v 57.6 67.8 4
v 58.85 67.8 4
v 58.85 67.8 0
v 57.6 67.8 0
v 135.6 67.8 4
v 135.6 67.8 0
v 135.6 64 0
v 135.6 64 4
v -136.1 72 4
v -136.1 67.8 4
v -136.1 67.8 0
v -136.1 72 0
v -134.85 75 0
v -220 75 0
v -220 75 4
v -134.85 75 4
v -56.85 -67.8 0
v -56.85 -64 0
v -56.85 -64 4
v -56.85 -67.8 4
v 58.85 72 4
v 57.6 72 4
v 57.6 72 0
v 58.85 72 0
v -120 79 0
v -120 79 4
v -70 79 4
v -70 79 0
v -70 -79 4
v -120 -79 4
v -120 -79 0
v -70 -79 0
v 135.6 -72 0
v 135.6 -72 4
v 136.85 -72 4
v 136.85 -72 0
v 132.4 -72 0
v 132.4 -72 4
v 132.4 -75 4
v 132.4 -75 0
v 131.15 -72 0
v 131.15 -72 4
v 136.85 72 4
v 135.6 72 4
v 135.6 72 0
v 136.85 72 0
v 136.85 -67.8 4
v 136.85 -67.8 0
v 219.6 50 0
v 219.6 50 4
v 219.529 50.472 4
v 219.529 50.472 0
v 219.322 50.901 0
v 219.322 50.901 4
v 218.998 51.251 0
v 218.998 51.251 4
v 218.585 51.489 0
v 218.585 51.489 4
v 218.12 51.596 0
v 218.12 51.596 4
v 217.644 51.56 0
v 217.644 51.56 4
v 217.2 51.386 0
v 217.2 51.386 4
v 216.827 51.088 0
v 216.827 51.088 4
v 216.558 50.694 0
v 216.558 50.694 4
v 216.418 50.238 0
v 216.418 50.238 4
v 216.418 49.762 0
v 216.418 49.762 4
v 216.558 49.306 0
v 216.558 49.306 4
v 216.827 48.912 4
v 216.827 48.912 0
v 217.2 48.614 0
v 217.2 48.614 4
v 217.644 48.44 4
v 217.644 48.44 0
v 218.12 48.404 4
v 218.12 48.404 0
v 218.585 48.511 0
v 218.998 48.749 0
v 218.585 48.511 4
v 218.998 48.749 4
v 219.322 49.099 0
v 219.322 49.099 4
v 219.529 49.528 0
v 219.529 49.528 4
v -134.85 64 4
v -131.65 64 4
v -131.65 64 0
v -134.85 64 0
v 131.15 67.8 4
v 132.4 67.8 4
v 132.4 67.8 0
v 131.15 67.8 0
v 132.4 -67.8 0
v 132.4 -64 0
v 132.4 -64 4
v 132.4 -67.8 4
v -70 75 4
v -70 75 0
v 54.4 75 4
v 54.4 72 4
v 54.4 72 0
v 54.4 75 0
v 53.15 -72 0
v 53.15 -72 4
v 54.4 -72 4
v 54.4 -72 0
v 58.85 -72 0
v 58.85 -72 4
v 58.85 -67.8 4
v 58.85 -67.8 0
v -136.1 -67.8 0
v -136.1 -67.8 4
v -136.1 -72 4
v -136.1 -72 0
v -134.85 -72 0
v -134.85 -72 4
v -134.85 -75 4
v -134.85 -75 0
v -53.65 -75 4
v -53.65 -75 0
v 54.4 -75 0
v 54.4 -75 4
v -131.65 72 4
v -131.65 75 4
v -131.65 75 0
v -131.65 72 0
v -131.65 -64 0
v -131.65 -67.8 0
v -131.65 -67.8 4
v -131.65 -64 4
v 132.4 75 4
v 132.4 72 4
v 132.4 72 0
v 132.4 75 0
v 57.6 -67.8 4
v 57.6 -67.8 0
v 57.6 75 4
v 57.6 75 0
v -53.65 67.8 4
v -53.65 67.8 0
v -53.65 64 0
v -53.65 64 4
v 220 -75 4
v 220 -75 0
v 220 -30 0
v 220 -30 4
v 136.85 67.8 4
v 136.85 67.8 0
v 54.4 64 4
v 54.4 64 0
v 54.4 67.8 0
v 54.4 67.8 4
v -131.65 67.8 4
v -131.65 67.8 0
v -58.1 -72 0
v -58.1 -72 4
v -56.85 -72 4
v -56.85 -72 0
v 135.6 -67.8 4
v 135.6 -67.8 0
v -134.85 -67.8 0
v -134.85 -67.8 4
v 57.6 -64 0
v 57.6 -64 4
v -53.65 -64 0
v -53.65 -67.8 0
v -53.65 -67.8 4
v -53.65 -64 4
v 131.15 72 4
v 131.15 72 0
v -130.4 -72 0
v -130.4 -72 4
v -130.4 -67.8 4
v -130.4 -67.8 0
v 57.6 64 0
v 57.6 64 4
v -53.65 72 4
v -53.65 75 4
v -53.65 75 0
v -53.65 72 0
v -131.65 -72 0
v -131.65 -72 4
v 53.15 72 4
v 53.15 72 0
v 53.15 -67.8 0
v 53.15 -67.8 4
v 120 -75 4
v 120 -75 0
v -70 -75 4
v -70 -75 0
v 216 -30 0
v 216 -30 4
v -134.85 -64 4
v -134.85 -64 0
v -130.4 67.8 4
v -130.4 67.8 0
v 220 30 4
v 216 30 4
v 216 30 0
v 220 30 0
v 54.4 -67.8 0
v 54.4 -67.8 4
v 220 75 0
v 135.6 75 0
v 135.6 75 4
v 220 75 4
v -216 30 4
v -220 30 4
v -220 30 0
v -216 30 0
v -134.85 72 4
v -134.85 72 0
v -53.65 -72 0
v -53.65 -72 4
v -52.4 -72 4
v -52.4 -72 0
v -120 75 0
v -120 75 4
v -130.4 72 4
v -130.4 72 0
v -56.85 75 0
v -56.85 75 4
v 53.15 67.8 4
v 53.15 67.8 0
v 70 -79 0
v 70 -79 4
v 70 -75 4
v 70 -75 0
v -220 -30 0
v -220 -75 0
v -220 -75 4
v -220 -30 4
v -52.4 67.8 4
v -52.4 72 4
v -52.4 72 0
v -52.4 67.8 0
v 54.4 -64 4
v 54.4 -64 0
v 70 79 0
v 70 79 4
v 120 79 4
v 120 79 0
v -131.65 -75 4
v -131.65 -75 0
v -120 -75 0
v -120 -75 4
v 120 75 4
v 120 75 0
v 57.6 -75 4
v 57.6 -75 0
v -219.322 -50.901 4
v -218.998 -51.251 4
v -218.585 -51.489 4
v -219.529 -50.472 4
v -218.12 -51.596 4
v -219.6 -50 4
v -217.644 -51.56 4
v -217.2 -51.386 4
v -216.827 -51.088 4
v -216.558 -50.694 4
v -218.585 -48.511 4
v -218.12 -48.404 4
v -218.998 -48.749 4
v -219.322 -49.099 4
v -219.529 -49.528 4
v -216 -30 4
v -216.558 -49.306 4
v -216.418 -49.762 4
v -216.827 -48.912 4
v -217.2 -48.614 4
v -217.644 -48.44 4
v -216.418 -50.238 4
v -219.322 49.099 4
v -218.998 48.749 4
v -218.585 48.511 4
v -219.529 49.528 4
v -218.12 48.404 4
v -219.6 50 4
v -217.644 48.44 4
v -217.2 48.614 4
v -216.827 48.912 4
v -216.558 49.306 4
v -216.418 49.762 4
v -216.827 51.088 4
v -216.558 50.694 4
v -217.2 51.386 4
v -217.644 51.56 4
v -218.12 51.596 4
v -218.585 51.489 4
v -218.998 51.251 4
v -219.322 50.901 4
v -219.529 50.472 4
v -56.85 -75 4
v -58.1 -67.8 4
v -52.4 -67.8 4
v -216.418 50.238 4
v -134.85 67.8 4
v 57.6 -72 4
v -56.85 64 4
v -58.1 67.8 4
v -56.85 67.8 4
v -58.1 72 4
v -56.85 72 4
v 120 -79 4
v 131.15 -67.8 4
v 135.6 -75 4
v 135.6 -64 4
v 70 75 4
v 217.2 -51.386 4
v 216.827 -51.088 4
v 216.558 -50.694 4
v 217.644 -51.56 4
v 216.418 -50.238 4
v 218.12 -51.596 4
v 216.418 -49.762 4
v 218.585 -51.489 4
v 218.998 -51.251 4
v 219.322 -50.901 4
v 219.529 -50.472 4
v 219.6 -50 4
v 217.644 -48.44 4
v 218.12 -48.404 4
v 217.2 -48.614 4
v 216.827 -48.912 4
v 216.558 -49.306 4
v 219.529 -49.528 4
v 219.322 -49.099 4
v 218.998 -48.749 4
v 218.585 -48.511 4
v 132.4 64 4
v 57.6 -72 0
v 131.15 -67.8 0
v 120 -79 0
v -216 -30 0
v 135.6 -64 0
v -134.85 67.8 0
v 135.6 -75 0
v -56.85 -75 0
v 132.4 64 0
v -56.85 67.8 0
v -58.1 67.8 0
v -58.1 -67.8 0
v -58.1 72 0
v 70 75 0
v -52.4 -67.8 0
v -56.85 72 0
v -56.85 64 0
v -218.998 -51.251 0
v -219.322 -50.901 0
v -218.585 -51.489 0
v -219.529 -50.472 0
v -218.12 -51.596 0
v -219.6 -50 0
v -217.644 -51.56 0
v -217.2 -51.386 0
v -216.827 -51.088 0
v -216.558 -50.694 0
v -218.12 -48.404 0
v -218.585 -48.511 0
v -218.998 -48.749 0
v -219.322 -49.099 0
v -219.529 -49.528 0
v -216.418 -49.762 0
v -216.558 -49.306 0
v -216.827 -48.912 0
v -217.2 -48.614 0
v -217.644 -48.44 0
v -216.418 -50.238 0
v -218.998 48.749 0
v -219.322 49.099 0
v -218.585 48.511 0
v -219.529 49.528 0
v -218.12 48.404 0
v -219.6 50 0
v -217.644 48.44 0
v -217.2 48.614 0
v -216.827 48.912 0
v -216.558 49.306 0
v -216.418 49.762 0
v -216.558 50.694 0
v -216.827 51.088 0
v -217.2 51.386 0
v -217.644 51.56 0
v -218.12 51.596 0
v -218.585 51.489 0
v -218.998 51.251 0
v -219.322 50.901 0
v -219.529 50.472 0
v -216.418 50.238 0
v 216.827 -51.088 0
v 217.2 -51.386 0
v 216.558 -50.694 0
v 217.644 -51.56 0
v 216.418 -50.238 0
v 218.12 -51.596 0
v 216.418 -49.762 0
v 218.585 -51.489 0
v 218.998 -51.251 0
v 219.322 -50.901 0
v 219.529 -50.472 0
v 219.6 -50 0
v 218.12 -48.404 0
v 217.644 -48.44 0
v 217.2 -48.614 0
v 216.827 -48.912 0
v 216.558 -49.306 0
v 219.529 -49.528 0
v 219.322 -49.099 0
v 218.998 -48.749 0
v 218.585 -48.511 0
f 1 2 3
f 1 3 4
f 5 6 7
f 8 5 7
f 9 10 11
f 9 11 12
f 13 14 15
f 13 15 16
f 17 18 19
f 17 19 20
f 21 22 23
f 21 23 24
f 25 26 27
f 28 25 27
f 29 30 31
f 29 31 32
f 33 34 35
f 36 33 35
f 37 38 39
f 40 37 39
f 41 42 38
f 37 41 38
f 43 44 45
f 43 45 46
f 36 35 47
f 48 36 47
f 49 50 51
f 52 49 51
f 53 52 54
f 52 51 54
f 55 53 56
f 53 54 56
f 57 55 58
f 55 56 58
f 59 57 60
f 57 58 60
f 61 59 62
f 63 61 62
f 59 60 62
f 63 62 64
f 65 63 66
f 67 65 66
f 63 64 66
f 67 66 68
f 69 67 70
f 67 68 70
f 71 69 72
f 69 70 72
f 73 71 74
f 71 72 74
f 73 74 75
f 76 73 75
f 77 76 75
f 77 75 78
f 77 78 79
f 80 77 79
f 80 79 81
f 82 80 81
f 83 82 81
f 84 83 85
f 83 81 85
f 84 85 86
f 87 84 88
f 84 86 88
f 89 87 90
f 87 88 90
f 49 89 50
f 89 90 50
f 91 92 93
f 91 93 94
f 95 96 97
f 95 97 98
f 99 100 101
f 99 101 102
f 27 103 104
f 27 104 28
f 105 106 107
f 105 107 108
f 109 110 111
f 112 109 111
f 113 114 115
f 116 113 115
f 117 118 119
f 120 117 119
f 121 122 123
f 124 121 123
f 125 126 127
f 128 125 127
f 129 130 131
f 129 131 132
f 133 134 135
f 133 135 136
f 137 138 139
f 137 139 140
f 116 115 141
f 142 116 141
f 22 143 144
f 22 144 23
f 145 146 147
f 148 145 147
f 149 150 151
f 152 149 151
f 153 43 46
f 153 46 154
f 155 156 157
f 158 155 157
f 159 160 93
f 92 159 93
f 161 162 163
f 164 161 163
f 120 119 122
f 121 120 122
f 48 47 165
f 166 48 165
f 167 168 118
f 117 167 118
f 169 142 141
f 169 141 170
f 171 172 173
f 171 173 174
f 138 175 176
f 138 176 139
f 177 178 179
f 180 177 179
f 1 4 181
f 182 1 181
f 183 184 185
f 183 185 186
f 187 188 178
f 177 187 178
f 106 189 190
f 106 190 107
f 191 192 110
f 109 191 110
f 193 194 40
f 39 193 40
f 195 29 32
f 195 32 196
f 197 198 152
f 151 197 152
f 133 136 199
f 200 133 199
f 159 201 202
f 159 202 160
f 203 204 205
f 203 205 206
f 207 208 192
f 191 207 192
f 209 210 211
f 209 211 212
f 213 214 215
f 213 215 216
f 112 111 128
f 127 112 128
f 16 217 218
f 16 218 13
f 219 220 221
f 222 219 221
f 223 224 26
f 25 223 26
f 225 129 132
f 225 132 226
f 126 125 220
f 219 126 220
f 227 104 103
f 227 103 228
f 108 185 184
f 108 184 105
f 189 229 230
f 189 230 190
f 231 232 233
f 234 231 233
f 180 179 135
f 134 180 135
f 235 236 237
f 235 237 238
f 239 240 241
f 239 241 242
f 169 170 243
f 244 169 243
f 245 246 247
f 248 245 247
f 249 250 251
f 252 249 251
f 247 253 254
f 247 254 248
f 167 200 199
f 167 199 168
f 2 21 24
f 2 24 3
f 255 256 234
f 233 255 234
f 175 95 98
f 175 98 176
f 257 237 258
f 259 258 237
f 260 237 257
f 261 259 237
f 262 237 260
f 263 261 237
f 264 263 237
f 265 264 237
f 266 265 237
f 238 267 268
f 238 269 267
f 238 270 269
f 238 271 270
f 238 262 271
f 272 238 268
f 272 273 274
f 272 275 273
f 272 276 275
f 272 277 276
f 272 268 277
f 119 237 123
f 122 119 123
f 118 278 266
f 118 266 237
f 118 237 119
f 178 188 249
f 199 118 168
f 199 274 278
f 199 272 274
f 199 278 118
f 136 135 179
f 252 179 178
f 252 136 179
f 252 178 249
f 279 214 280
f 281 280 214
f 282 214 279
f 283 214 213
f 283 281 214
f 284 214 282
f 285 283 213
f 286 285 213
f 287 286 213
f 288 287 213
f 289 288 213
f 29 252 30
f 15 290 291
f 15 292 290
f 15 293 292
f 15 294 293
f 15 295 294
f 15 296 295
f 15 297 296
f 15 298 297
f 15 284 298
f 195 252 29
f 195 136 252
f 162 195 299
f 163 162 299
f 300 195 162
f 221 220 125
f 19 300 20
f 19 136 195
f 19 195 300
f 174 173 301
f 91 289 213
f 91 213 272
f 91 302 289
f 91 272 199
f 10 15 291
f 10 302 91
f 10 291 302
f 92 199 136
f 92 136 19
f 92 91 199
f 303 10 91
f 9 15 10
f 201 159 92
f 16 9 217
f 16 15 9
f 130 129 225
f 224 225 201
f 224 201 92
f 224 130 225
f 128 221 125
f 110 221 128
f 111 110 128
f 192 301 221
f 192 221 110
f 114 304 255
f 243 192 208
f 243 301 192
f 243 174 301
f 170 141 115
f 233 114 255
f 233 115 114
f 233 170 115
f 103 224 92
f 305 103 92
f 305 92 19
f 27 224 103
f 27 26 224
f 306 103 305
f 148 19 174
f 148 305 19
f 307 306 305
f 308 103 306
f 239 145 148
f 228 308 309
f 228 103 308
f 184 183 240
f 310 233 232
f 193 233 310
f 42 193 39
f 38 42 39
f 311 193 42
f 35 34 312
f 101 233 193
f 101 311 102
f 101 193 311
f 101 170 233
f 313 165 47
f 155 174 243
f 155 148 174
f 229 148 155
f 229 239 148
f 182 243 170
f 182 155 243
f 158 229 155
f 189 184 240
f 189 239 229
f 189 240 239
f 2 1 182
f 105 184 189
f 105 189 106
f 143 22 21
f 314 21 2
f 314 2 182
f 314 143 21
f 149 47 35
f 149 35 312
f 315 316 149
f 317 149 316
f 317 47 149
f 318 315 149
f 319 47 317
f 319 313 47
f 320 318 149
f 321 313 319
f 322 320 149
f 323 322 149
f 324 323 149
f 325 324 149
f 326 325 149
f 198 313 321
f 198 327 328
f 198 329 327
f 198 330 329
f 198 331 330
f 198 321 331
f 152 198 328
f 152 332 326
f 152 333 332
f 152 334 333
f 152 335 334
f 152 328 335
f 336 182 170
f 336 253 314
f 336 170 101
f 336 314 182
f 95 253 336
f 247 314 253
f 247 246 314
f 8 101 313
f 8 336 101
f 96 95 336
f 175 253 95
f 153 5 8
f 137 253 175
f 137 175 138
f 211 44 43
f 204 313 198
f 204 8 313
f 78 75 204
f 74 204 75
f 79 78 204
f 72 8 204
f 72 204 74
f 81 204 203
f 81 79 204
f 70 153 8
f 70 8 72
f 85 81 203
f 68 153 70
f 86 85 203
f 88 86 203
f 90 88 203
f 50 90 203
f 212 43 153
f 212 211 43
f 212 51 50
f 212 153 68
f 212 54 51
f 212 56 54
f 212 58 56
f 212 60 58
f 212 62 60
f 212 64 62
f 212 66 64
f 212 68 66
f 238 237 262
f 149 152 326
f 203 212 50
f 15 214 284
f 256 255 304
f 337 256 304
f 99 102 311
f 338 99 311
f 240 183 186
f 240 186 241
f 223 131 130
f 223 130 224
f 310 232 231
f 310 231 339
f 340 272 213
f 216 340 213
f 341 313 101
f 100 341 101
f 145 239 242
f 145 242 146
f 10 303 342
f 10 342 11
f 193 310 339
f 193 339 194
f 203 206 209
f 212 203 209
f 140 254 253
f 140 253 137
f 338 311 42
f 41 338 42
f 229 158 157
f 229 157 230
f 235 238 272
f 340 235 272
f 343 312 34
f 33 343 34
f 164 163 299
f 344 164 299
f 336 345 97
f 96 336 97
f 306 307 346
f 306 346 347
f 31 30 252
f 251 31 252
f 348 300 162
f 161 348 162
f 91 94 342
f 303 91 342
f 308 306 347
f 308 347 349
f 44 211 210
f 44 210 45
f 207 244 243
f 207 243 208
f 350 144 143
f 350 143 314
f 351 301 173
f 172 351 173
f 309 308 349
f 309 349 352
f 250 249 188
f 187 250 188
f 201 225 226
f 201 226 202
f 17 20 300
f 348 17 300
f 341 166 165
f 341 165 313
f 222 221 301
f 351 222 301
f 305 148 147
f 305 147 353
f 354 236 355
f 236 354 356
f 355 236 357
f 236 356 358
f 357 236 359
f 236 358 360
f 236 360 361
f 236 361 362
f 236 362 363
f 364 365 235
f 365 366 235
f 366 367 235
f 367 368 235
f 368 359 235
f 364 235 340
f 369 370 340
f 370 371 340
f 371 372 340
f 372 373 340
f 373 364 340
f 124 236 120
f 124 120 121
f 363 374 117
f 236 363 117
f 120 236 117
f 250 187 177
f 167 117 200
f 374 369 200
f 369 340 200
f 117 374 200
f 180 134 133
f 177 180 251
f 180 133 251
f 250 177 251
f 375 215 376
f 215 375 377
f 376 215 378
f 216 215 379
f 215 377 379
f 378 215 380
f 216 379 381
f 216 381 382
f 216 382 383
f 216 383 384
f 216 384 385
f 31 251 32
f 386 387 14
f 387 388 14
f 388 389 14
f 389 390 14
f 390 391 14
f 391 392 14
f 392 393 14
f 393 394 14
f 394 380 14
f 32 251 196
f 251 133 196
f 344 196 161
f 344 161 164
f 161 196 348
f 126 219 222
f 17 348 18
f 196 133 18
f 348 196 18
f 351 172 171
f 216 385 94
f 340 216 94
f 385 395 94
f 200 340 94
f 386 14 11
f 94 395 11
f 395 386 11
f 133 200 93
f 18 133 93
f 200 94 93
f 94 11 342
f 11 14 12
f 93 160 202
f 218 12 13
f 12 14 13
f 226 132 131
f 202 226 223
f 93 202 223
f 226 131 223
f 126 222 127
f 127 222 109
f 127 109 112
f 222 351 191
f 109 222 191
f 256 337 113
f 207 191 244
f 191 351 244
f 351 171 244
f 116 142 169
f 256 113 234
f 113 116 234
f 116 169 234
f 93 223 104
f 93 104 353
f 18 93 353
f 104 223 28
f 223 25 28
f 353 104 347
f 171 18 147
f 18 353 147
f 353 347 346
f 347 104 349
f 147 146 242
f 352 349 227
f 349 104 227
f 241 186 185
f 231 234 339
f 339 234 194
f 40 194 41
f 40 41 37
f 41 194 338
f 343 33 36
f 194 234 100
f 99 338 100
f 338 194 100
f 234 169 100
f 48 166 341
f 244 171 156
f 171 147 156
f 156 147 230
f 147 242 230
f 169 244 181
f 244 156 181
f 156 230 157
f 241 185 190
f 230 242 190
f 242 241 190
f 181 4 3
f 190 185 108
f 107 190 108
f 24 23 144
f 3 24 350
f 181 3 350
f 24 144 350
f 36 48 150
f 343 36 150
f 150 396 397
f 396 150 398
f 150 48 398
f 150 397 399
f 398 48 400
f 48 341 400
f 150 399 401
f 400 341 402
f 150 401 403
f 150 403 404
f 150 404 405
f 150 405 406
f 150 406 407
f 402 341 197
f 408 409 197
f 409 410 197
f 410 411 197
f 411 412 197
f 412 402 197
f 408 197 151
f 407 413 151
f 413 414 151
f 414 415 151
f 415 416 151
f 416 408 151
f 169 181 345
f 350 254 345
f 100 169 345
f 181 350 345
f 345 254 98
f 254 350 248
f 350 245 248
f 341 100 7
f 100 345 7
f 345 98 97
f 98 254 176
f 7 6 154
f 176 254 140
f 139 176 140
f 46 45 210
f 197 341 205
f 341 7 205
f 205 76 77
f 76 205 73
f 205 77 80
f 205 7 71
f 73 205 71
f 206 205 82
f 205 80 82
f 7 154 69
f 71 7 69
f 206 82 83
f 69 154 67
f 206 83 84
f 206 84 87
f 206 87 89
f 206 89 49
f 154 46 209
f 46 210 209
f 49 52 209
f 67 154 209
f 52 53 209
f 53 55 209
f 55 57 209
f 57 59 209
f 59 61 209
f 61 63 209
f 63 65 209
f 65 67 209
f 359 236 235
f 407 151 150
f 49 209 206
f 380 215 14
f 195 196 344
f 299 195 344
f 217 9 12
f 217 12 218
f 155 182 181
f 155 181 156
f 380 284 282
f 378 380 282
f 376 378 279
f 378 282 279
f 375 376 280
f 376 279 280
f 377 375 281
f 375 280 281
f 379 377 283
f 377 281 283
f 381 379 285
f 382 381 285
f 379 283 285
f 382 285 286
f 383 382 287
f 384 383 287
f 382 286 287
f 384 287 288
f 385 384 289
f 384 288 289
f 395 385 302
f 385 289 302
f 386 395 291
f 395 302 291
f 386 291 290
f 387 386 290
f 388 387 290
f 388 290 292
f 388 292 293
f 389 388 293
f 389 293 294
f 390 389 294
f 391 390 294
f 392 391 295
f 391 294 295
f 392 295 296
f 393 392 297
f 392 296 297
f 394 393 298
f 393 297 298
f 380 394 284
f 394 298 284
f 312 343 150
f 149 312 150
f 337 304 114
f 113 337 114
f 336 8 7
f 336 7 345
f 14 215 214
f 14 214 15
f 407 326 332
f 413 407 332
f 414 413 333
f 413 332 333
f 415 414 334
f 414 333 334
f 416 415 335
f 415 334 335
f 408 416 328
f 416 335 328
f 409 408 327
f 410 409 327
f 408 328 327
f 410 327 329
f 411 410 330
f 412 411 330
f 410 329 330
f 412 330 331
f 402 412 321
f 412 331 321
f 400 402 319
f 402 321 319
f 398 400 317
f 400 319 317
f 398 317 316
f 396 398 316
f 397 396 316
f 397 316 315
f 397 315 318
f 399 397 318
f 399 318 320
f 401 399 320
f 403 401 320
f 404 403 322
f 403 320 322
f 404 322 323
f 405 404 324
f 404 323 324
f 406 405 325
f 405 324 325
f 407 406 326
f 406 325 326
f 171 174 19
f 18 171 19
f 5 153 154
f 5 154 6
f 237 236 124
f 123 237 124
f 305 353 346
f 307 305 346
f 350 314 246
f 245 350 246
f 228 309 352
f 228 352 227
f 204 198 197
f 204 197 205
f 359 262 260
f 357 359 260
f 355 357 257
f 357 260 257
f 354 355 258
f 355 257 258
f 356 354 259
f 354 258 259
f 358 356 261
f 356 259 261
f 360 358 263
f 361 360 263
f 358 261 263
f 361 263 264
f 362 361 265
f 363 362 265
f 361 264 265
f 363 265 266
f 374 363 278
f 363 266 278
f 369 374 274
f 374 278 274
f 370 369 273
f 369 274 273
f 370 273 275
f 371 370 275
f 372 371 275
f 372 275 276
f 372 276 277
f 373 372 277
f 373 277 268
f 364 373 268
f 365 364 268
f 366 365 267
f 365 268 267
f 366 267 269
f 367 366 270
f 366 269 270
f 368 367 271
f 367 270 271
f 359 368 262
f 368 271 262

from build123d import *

# Parameters (mm, degrees)
ESQUISSE1_W             = 440
ESQUISSE1_H             = 150
BOSS_EXTRU_1_DEPTH      = 4
ESQUISSE2_W             = 4
ESQUISSE2_H             = 60
ENL_V_MAT_EXTRU_1_DEPTH = 4
ESQUISSE3_W             = 50
ESQUISSE3_H             = 4
BOSS_EXTRU_2_DEPTH      = 4
ENL_V_MAT_EXTRU_2_DEPTH = 10
ESQUISSE5_R             = 1.6
ENL_V_MAT_EXTRU_3_DEPTH = 4


with BuildPart() as part:
    # Esquisse1 → Boss.-Extru.1 (new body)
    with BuildSketch(Plane.XY):
        Rectangle(ESQUISSE1_W, ESQUISSE1_H)
    extrude(amount=BOSS_EXTRU_1_DEPTH)

    # Esquisse2 → Enlèv. mat.-Extru.1 (cut)
    with BuildSketch(Plane.XY.offset(4)):
        with Locations((-218, 0)):
            Rectangle(ESQUISSE2_W, ESQUISSE2_H)
        with Locations((218, 0)):
            Rectangle(ESQUISSE2_W, ESQUISSE2_H)
    extrude(amount=-ENL_V_MAT_EXTRU_1_DEPTH, mode=Mode.SUBTRACT)

    # Esquisse3 → Boss.-Extru.2 (add)
    with BuildSketch(Plane.XY.offset(4)):
        with Locations((-95, -77)):
            Rectangle(ESQUISSE3_W, ESQUISSE3_H)
        with Locations((95, -77)):
            Rectangle(ESQUISSE3_W, ESQUISSE3_H)
        with Locations((95, 77)):
            Rectangle(ESQUISSE3_W, ESQUISSE3_H)
        with Locations((-95, 77)):
            Rectangle(ESQUISSE3_W, ESQUISSE3_H)
    extrude(amount=-BOSS_EXTRU_2_DEPTH)

    # Esquisse4 → Enlèv. mat.-Extru.2 (cut)
    with BuildSketch(Plane.XY.offset(4)):
        Polygon((132.4, 75), (135.6, 75), (135.6, 72), (136.85, 72), (136.85, 67.8), (135.6, 67.8), (135.6, 64), (132.4, 64), (132.4, 67.8), (131.15, 67.8), (131.15, 72), (132.4, 72), align=None)
        Polygon((54.4, 75), (57.6, 75), (57.6, 72), (58.85, 72), (58.85, 67.8), (57.6, 67.8), (57.6, 64), (54.4, 64), (54.4, 67.8), (53.15, 67.8), (53.15, 72), (54.4, 72), align=None)
        Polygon((-56.849728223, 75), (-53.649728223, 75), (-53.649728223, 72), (-52.399728223, 72), (-52.399728223, 67.8), (-53.649728223, 67.8), (-53.649728223, 64), (-56.849728223, 64), (-56.849728223, 67.8), (-58.099728223, 67.8), (-58.099728223, 72), (-56.849728223, 72), align=None)
        Polygon((-134.849728223, 75), (-131.649728223, 75), (-131.649728223, 72), (-130.399728223, 72), (-130.399728223, 67.8), (-131.649728223, 67.8), (-131.649728223, 64), (-134.849728223, 64), (-134.849728223, 67.8), (-136.099728223, 67.8), (-136.099728223, 72), (-134.849728223, 72), align=None)
        Polygon((-131.649728223, -75), (-131.649728223, -72), (-130.399728223, -72), (-130.399728223, -67.8), (-131.649728223, -67.8), (-131.649728223, -64), (-134.849728223, -64), (-134.849728223, -67.8), (-136.099728223, -67.8), (-136.099728223, -72), (-134.849728223, -72), (-134.849728223, -75), align=None)
        Polygon((-53.649728223, -75), (-53.649728223, -72), (-52.399728223, -72), (-52.399728223, -67.8), (-53.649728223, -67.8), (-53.649728223, -64), (-56.849728223, -64), (-56.849728223, -67.8), (-58.099728223, -67.8), (-58.099728223, -72), (-56.849728223, -72), (-56.849728223, -75), align=None)
        Polygon((57.6, -75), (57.6, -72), (58.85, -72), (58.85, -67.8), (57.6, -67.8), (57.6, -64), (54.4, -64), (54.4, -67.8), (53.15, -67.8), (53.15, -72), (54.4, -72), (54.4, -75), align=None)
        Polygon((135.6, -75), (135.6, -72), (136.85, -72), (136.85, -67.8), (135.6, -67.8), (135.6, -64), (132.4, -64), (132.4, -67.8), (131.15, -67.8), (131.15, -72), (132.4, -72), (132.4, -75), align=None)
    extrude(amount=-ENL_V_MAT_EXTRU_2_DEPTH, mode=Mode.SUBTRACT)

    # Esquisse5 → Enlèv. mat.-Extru.3 (cut)
    with BuildSketch(Plane.XY.offset(4)):
        with Locations((218, -50)):
            Circle(ESQUISSE5_R)
        with Locations((218, 50)):
            Circle(ESQUISSE5_R)
        with Locations(Location((-218, 50, 0), (0, 0, 180))):
            Circle(ESQUISSE5_R)
        with Locations(Location((-218, -50, 0), (0, 0, 180))):
            Circle(ESQUISSE5_R)
    extrude(amount=-ENL_V_MAT_EXTRU_3_DEPTH, mode=Mode.SUBTRACT)


solid = part.part
